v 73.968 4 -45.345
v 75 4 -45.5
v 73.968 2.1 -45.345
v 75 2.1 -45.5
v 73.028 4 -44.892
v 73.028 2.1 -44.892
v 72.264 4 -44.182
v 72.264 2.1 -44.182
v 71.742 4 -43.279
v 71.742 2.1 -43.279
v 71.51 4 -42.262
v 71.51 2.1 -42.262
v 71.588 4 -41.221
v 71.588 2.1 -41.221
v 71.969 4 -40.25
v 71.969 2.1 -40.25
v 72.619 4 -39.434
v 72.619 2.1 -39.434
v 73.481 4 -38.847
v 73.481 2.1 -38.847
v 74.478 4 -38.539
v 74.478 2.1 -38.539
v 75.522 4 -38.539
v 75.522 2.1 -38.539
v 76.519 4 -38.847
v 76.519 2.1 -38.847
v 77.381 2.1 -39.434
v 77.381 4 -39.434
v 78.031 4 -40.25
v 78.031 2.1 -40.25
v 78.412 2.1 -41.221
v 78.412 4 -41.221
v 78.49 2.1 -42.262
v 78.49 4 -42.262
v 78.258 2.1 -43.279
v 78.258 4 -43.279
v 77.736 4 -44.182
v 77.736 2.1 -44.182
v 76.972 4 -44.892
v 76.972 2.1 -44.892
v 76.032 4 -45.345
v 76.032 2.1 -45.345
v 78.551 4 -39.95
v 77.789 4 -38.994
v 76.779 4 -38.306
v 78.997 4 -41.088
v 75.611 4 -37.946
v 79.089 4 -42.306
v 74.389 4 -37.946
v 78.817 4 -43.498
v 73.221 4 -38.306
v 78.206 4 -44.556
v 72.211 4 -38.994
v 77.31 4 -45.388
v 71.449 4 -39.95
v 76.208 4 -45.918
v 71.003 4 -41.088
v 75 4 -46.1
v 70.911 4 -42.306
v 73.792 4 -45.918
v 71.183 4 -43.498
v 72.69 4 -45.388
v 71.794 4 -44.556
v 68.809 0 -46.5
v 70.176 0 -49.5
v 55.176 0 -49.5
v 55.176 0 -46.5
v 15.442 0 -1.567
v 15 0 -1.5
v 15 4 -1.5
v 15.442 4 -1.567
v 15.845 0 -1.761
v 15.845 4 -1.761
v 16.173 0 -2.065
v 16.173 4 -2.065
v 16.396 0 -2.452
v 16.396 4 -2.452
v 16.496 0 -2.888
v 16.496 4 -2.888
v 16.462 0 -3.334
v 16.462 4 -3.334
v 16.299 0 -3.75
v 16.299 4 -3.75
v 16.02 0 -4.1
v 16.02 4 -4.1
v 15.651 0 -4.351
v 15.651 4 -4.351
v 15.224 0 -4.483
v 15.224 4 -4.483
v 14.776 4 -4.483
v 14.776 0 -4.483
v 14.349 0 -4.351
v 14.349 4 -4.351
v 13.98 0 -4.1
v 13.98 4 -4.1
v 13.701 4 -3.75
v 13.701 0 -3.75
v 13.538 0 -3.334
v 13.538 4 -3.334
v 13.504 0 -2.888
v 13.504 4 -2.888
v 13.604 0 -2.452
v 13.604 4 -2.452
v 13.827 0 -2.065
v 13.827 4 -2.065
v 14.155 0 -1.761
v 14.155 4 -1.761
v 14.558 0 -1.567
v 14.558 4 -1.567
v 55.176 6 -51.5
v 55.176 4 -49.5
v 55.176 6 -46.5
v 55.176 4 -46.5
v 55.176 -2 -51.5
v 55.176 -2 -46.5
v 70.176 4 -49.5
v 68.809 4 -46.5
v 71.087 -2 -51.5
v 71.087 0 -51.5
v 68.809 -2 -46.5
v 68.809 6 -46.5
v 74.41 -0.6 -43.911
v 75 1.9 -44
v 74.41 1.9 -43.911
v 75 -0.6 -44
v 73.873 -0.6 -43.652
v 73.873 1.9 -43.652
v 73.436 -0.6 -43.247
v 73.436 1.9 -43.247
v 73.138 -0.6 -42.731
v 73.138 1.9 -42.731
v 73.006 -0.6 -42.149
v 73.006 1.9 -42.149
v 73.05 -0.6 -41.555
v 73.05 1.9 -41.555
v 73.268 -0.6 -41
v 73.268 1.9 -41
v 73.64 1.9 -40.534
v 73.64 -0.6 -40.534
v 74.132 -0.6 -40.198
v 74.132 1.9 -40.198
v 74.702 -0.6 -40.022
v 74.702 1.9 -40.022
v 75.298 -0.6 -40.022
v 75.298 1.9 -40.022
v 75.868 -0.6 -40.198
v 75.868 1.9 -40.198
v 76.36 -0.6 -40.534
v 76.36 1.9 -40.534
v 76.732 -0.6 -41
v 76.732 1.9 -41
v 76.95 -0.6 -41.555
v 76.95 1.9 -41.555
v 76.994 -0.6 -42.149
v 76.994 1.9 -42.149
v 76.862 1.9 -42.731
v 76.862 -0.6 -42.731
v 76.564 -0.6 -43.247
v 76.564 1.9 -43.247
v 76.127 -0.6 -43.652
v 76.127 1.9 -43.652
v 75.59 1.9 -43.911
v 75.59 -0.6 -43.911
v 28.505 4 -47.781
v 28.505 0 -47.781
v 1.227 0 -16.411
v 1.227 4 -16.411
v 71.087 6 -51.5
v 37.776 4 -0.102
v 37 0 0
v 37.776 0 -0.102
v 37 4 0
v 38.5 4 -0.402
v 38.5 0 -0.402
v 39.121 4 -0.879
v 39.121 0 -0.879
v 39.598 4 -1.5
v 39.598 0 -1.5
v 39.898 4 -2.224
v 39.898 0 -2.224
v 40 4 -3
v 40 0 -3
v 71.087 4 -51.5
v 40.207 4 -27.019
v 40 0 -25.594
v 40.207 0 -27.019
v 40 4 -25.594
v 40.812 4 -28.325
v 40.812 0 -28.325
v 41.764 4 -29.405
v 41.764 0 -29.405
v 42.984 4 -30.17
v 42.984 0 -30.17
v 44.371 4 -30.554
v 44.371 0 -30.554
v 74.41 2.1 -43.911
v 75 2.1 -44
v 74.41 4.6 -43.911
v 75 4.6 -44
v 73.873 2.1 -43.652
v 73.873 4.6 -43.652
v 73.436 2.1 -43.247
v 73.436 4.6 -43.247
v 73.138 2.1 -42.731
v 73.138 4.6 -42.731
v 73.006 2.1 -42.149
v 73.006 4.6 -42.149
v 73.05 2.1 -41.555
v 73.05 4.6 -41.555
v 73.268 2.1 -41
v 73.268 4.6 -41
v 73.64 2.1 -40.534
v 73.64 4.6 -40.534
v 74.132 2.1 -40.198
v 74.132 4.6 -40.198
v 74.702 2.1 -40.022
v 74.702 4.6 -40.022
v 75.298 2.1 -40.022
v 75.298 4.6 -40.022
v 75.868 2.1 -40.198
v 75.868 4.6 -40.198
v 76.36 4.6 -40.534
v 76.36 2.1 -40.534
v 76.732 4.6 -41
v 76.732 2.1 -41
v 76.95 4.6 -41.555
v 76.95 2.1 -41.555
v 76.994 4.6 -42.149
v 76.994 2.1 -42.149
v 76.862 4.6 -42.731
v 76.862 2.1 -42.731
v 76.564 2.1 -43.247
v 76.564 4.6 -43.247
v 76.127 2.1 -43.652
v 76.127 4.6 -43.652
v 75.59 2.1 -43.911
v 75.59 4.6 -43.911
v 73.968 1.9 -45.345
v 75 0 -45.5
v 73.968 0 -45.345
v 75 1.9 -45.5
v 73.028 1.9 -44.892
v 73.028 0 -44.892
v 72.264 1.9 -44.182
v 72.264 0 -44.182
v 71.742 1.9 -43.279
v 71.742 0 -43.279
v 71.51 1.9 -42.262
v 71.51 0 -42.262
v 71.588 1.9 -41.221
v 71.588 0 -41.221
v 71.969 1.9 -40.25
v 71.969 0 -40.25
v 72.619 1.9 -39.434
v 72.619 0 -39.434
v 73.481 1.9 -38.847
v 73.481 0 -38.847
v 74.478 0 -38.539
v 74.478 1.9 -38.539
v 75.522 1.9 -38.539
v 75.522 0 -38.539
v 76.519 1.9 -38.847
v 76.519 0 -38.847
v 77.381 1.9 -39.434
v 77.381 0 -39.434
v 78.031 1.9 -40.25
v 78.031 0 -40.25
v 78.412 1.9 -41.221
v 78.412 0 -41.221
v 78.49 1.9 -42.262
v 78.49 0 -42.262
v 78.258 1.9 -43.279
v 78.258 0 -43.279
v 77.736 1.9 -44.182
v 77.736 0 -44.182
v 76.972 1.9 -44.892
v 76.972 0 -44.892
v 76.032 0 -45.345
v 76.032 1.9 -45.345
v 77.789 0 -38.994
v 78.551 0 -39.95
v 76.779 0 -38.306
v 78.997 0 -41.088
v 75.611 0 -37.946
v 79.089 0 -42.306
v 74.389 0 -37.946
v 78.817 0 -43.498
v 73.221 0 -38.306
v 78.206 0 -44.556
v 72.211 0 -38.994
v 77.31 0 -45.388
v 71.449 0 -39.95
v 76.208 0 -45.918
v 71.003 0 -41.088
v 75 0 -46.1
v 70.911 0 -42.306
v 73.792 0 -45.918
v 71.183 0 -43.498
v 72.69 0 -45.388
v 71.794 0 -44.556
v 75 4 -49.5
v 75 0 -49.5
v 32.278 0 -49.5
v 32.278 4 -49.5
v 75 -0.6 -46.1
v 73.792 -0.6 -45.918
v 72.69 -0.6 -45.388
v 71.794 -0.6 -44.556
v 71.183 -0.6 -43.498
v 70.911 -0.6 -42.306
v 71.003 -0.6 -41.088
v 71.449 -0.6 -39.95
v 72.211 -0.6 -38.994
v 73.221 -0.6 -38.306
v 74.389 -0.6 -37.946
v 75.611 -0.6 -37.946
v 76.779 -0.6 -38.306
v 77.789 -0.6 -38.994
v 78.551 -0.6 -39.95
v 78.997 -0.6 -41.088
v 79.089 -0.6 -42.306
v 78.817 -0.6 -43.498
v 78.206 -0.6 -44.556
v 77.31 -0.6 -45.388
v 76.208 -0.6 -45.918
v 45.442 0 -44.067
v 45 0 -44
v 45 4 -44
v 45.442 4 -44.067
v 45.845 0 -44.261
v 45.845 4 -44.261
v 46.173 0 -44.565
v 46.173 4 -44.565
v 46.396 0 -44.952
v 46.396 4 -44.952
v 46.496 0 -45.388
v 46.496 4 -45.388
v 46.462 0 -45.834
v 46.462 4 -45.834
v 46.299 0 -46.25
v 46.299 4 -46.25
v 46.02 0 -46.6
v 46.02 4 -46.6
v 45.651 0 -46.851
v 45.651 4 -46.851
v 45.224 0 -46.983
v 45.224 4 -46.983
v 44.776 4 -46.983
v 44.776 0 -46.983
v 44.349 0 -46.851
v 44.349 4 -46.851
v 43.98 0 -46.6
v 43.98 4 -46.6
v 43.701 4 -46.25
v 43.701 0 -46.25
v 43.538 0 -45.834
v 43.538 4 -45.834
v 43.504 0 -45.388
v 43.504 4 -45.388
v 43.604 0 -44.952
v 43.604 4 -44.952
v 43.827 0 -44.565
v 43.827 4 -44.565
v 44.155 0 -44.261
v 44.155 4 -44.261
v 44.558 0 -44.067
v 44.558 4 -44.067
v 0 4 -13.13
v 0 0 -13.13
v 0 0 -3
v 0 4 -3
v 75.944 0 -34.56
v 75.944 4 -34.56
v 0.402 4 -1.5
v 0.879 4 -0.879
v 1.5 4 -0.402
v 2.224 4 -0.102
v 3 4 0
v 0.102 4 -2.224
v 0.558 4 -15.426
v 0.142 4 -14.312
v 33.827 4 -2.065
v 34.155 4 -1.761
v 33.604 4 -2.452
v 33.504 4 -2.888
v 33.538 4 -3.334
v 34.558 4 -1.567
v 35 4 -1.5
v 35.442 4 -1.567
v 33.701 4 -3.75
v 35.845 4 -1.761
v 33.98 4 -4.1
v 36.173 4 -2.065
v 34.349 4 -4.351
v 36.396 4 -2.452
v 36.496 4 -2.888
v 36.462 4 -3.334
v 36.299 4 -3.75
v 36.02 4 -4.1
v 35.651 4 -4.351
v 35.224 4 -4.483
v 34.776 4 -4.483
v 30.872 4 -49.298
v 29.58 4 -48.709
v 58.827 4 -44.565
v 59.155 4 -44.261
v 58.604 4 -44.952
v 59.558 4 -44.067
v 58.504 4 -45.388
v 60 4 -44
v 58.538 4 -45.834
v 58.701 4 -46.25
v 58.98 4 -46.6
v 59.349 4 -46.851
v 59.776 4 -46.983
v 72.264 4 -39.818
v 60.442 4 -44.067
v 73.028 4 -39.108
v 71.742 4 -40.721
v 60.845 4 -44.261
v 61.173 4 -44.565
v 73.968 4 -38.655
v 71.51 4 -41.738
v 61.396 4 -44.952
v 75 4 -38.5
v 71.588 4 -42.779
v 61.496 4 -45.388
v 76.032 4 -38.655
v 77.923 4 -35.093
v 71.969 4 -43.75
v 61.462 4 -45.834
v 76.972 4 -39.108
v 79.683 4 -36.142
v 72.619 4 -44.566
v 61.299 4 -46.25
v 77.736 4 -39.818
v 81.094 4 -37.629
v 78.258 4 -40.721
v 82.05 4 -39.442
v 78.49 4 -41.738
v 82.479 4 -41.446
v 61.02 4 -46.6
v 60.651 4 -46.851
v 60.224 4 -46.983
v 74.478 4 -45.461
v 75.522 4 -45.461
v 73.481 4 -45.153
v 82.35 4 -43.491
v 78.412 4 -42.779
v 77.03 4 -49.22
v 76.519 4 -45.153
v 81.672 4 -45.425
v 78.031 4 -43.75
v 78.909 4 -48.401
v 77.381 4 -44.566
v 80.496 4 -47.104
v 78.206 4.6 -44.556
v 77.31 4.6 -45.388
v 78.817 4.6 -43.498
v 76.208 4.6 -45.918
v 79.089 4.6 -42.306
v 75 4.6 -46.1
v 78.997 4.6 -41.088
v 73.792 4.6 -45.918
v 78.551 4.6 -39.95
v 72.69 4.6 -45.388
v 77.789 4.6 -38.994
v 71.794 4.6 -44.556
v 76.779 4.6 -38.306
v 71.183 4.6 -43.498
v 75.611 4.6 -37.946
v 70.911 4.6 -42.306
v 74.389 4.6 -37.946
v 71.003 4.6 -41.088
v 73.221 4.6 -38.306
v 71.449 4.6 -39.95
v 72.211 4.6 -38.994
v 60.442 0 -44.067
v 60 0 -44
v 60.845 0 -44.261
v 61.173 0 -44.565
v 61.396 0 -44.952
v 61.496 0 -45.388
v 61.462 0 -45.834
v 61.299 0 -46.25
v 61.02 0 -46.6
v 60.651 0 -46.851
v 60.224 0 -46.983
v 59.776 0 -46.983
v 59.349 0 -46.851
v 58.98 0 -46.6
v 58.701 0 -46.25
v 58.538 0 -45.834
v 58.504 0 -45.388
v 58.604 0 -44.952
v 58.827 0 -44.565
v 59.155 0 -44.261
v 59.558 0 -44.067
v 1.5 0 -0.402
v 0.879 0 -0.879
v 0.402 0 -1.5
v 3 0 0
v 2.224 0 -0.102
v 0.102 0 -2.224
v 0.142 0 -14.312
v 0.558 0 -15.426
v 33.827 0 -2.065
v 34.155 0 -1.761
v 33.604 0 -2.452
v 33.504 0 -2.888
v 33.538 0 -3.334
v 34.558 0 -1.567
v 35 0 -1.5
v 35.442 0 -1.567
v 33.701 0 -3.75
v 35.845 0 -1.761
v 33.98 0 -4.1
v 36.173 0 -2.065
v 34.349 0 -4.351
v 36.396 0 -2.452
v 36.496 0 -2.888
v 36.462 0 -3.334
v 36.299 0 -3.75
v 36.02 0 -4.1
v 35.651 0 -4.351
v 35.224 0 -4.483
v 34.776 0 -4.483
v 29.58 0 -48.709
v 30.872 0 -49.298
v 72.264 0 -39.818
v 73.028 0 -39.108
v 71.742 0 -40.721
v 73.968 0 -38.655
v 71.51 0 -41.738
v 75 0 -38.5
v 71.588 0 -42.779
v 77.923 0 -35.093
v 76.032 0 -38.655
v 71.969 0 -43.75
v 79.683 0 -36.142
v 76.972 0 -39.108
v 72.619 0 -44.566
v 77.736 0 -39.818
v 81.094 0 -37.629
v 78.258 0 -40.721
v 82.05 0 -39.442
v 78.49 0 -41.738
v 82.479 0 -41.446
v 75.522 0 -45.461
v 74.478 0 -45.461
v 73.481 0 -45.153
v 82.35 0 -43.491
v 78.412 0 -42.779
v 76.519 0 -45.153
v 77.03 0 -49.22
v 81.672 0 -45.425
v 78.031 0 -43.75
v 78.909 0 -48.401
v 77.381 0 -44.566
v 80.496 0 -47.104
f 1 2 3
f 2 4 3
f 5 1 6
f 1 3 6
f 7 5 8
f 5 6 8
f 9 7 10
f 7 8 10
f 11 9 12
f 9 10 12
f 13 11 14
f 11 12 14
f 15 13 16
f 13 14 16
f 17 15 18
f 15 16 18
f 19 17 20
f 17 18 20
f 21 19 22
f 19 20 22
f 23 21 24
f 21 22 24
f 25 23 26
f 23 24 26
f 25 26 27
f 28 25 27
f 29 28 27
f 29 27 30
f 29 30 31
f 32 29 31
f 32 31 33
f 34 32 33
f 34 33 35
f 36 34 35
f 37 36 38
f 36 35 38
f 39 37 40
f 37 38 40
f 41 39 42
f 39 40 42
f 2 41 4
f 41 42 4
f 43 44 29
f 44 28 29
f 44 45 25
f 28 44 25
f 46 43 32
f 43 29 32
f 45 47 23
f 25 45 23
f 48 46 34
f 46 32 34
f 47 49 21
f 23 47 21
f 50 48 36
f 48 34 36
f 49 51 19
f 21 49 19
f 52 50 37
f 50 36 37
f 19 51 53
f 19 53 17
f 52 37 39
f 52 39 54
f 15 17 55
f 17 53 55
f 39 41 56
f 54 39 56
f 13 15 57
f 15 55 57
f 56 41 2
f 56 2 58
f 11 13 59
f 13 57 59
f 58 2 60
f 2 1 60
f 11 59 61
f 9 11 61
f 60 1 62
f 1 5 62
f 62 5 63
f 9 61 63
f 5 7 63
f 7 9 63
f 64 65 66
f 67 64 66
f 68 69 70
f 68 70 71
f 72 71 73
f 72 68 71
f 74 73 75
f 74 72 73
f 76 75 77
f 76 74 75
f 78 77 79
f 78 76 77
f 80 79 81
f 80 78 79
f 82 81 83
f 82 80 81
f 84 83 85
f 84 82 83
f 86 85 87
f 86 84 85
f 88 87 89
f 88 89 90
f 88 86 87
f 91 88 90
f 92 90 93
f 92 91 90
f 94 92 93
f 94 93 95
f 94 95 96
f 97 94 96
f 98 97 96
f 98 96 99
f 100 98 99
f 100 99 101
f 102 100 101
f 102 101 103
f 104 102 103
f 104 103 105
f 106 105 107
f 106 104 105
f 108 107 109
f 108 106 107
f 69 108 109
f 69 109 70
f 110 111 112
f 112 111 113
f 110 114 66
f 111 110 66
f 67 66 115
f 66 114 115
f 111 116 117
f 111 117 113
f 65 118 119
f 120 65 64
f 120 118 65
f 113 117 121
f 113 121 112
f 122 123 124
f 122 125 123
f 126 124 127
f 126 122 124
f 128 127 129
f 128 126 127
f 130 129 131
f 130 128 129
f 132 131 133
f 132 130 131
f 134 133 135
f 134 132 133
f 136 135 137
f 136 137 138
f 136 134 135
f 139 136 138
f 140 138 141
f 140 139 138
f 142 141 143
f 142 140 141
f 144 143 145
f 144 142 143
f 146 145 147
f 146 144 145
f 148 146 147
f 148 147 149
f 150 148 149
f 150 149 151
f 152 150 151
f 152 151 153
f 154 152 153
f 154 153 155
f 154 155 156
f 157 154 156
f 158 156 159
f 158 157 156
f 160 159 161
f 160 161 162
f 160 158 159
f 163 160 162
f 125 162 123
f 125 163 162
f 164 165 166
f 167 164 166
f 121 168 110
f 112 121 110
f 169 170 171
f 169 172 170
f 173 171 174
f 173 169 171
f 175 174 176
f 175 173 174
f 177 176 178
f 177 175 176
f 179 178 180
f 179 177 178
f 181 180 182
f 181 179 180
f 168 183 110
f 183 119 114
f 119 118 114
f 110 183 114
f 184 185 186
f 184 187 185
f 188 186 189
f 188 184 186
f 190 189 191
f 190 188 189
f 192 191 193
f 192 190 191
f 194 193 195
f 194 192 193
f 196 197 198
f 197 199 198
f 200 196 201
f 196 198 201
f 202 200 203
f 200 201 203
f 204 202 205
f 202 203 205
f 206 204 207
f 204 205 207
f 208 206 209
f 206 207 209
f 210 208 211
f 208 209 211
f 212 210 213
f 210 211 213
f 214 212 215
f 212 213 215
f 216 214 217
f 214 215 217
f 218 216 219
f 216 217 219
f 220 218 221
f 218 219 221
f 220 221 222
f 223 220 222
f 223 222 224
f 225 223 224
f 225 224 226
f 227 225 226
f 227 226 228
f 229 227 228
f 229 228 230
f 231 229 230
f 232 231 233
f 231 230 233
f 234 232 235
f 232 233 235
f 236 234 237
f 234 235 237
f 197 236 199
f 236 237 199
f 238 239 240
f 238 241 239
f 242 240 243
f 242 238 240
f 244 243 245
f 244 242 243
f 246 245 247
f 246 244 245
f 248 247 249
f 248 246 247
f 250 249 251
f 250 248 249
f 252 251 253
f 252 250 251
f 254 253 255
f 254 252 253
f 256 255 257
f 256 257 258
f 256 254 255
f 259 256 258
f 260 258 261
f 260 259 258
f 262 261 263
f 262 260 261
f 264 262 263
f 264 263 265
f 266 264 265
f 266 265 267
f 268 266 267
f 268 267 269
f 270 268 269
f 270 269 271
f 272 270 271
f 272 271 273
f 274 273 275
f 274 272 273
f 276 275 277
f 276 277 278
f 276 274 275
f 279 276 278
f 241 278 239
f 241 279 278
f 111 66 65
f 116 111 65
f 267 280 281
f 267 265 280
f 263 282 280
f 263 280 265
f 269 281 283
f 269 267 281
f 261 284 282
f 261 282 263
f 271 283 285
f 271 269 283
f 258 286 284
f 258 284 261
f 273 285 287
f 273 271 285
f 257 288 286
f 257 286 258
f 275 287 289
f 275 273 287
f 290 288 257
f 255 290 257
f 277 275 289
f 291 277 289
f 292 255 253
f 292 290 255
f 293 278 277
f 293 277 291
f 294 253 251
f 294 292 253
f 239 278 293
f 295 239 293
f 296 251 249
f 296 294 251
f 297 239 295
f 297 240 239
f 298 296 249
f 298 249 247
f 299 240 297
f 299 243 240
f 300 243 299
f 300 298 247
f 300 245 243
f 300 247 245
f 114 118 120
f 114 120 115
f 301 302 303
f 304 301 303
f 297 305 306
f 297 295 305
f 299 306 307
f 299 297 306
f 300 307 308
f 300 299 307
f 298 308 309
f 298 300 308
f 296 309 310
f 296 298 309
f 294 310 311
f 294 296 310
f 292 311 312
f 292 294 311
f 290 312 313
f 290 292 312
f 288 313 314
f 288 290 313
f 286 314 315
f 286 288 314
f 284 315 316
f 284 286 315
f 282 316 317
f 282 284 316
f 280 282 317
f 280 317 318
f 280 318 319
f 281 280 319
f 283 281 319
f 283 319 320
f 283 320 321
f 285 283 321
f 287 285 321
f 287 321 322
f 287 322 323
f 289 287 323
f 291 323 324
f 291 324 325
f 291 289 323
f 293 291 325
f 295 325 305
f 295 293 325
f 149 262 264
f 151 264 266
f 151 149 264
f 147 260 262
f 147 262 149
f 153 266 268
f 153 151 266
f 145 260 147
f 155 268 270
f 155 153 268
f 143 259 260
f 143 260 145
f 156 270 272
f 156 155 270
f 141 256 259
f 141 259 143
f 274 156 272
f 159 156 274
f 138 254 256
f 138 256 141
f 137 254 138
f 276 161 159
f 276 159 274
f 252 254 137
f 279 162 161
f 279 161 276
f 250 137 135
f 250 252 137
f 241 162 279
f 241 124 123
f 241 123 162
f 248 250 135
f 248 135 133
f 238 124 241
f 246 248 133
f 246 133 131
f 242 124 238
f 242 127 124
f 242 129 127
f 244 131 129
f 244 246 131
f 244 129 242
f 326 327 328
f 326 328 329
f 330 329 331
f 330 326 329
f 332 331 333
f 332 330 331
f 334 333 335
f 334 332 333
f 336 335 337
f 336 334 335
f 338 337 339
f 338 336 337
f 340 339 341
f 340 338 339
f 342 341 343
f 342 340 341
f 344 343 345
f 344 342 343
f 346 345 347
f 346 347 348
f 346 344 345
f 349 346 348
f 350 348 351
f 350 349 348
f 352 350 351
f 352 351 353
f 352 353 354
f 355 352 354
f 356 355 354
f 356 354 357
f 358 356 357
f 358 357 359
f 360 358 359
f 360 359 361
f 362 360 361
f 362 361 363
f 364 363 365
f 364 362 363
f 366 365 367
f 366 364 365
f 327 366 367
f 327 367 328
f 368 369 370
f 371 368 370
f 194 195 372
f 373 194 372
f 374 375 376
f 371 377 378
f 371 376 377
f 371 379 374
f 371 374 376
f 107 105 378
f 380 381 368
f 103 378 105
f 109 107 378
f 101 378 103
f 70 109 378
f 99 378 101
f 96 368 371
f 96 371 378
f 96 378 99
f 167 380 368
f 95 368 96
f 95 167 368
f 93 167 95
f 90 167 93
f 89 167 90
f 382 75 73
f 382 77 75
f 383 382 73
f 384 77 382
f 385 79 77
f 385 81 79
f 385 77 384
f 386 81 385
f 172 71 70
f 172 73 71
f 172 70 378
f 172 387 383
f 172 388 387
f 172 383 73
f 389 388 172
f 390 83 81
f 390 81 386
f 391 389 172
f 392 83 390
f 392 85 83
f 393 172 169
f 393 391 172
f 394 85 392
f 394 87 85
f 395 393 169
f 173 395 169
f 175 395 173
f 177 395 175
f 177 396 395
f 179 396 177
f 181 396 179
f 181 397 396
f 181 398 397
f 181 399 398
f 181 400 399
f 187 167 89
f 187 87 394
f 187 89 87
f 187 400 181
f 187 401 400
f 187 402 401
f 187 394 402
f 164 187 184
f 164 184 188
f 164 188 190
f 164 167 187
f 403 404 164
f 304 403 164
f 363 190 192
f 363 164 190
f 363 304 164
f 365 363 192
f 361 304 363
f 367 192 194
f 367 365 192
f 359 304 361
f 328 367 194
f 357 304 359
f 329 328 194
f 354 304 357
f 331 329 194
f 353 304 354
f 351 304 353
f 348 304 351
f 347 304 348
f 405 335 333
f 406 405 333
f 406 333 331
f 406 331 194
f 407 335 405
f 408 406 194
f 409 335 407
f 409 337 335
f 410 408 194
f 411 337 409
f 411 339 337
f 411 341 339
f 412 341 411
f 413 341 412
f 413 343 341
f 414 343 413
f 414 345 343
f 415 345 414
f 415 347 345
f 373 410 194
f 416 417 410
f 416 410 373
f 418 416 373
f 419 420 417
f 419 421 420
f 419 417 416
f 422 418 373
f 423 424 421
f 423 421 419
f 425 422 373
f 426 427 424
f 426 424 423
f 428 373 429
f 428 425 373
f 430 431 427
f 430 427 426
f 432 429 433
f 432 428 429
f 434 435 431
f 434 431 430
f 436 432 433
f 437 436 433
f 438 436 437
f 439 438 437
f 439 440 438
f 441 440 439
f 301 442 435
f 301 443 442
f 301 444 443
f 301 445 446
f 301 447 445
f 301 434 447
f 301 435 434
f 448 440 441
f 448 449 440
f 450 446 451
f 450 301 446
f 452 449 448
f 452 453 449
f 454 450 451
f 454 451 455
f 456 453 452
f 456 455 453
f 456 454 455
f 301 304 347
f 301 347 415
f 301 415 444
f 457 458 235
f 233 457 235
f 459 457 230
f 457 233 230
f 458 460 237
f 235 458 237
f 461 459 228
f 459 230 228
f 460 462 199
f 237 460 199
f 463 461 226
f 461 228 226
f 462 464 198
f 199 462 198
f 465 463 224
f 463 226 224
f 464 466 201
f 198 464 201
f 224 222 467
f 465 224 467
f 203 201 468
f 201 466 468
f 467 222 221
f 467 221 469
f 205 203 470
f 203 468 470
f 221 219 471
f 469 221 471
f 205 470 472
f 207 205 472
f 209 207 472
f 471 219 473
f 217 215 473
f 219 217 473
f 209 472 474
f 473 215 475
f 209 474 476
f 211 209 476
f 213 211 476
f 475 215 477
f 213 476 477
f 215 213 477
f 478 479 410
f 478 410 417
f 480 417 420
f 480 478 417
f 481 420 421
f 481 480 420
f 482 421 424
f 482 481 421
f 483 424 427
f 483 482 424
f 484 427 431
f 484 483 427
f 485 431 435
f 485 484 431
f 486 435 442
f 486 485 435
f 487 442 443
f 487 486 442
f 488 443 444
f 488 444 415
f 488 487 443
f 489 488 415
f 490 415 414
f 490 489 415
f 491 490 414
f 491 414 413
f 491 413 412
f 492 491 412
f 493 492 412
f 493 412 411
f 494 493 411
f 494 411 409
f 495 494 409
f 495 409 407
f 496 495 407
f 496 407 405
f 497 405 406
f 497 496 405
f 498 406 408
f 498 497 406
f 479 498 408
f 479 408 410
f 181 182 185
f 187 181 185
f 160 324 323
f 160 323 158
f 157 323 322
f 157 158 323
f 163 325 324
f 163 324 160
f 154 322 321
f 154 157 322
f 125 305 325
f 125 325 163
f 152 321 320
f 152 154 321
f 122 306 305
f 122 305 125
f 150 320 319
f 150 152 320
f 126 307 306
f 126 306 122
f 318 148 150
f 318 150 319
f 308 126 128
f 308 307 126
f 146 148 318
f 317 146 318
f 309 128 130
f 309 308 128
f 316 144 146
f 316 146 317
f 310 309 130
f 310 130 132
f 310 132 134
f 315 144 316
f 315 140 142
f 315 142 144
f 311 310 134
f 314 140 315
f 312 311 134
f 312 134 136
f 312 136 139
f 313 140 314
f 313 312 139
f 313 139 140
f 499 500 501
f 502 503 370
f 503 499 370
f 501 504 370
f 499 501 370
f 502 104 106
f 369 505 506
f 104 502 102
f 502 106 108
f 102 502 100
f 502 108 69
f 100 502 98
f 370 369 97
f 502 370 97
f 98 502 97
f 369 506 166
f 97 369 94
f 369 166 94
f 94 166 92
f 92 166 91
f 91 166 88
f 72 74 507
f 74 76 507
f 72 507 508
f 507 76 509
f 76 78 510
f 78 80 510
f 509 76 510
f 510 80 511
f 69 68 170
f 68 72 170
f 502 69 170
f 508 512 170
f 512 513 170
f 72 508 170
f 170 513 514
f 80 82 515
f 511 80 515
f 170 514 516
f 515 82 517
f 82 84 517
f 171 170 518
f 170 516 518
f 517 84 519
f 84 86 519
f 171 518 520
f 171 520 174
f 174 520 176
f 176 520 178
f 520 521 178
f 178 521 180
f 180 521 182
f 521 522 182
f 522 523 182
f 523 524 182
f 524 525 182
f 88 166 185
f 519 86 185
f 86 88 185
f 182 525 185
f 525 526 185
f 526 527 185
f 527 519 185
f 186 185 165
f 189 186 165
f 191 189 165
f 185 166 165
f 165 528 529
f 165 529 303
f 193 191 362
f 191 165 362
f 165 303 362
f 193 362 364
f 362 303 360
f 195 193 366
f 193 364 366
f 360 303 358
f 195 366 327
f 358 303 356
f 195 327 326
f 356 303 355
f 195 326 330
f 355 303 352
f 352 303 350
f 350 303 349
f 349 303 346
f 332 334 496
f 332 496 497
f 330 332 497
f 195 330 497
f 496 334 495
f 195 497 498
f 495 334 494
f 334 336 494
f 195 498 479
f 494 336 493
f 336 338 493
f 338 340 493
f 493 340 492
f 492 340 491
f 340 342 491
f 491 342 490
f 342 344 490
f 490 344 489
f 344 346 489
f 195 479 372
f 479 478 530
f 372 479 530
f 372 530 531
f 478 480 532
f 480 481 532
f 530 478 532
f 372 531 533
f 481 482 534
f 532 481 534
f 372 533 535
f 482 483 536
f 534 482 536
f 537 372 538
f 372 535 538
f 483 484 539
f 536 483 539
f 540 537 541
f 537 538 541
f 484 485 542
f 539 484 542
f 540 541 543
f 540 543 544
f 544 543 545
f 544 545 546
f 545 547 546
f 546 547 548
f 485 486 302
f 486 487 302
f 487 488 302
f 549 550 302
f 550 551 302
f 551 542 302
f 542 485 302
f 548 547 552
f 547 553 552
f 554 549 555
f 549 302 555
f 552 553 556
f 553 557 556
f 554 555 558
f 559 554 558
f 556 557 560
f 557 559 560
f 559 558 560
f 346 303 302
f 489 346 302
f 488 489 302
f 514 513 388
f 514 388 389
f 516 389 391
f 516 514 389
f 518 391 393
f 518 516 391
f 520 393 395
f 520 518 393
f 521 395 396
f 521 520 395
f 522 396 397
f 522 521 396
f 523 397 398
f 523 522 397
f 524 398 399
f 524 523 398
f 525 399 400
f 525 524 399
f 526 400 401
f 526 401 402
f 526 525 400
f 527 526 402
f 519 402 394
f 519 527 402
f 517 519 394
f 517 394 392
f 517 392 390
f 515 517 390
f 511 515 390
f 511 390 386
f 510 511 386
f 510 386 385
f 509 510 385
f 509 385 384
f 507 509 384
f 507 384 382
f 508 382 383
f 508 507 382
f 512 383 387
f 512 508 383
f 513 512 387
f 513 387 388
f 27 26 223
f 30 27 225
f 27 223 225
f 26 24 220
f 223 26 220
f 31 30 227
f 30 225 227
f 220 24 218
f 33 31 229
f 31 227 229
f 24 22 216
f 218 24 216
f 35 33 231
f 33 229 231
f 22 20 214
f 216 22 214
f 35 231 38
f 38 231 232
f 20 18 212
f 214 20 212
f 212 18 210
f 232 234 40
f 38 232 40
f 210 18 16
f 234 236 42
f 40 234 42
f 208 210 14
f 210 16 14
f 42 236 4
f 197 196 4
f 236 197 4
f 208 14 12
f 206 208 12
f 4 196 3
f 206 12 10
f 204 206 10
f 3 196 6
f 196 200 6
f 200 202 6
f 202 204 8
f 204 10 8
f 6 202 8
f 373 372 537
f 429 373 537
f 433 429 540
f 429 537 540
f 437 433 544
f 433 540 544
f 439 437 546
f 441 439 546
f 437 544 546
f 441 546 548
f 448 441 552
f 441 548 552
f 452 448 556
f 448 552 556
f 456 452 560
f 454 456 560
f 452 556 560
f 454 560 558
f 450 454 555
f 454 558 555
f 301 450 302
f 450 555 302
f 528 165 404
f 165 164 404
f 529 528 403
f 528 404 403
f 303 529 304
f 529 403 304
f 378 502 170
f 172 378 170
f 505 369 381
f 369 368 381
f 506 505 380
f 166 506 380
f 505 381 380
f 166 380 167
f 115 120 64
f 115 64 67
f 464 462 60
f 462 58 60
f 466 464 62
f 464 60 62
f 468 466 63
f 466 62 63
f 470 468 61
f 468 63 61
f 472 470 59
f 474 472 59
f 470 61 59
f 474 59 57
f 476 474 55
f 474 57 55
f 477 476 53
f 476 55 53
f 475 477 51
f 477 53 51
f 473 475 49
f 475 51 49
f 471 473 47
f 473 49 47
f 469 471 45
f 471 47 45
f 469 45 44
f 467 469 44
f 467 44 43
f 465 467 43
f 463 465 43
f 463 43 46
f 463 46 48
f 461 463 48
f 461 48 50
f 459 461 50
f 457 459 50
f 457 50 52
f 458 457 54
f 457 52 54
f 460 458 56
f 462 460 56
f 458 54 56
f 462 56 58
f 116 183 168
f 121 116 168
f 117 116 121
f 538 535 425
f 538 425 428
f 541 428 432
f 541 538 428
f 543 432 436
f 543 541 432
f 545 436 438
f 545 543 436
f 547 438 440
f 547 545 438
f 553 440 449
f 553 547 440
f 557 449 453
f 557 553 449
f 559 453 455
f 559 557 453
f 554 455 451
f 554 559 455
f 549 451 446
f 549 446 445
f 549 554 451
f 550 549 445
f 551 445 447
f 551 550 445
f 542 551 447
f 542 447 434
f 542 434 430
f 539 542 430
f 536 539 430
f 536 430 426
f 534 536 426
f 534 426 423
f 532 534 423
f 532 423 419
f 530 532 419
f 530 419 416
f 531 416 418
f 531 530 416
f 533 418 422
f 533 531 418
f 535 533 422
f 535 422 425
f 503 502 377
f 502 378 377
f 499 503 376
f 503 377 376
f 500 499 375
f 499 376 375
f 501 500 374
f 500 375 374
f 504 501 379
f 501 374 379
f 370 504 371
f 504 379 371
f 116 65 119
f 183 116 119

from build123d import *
from OCP.BRepFilletAPI import BRepFilletAPI_MakeFillet

# Parameters (mm, degrees)
SKETCH_1_R             = 3.5
SKETCH_1_R_2           = 1.5
EXTRUDE_1_DEPTH        = 4
FILLET_1_R1            = 5
FILLET_1_R2            = 3
EXTRUDE_2_DEPTH        = 2
PATTERN_LINEAR_1_COUNT = 2
PATTERN_LINEAR_1_PITCH = 6
EXTRUDE_4_DEPTH        = 4


with BuildPart() as part:
    # 草图1 → 凸台-拉伸1 (new body)
    with BuildSketch(Plane(origin=(0, 0, 0), x_dir=(1, 0, 0), z_dir=(0, 1, 0))):
        with BuildLine():
            Line((0, 0), (40, 0))
            Line((40, 0), (40, 30))
            Line((40, 30), (75.943842427, 34.559626254))
            ThreePointArc((75.943842427, 34.559626254), (82.485078593, 42.472861982), (75, 49.5))
            Line((75, 49.5), (30, 49.5))
            Line((30, 49.5), (0, 15))
            Line((0, 15), (0, 0))
        make_face()
        with Locations(Location((75, 42, 0), (0, 0, 270))):
            Circle(SKETCH_1_R, mode=Mode.SUBTRACT)
        with Locations(Location((15, 3, 0), (0, 0, 270))):
            Circle(SKETCH_1_R_2, mode=Mode.SUBTRACT)
        with Locations(Location((35, 3, 0), (0, 0, 270))):
            Circle(SKETCH_1_R_2, mode=Mode.SUBTRACT)
        with Locations(Location((45, 45.5, 0), (0, 0, 270))):
            Circle(SKETCH_1_R_2, mode=Mode.SUBTRACT)
        with Locations(Location((60, 45.5, 0), (0, 0, 270))):
            Circle(SKETCH_1_R_2, mode=Mode.SUBTRACT)
    extrude(amount=EXTRUDE_1_DEPTH)

    # 圆角1: one fillet with a radius per group of edges: ONE call of the kernel's fillet builder (fillet() takes one radius for all edges)
    fillet_1_edges_1 = [part.edges().sort_by_distance(p)[0] for p in [
        (40, 2, -30),
        (30, 2, -49.5),
        (0, 2, -15),
    ]]
    fillet_1_edges_2 = [part.edges().sort_by_distance(p)[0] for p in [
        (40, 2, 0),
        (0, 2, 0),
    ]]
    fillet_1 = BRepFilletAPI_MakeFillet(part.part.solid().wrapped)
    for e in fillet_1_edges_1:
        fillet_1.Add(FILLET_1_R1, e.wrapped)
    for e in fillet_1_edges_2:
        fillet_1.Add(FILLET_1_R2, e.wrapped)
    add(Compound.cast(fillet_1.Shape()), mode=Mode.REPLACE)


with BuildPart() as body_2:
    # 草图2 → 旋转1 (revolve)
    with BuildSketch(Plane.ZY.offset(-75), mode=Mode.PRIVATE) as revolve_1_sk:
        Polygon((-38.5, 0), (-38.5, 1.9), (-40, 1.9), (-40, -0.6), (-37.9, -0.6), (-37.9, 0), align=None)
        Polygon((-38.5, 2.1), (-40, 2.1), (-40, 4.6), (-37.9, 4.6), (-37.9, 4), (-38.5, 4), align=None)
    revolve(revolve_1_sk.sketch.rotate(Axis((75, 0, -42), (0, 1, 0)), 180), axis=Axis((75, 0, -42), (0, 1, 0)))


with BuildPart() as body_3:
    # 草图3 → 凸台-拉伸2 (new body)
    with BuildSketch(Plane(origin=(0, 4, 0), x_dir=(1, 0, 0), z_dir=(0, 1, 0))):
        Polygon((71.087290406, 51.5), (68.808659128, 46.5), (55.175837895, 46.5), (55.175837895, 51.5), align=None)
    extrude_2 = extrude(amount=EXTRUDE_2_DEPTH)



with BuildPart() as pattern_linear_1_1:
    # 阵列(线性)1: 凸台-拉伸2 ×2
    with Locations(*[(0, -i * PATTERN_LINEAR_1_PITCH, 0) for i in range(1, PATTERN_LINEAR_1_COUNT)]):
        add(extrude_2)


with BuildPart() as body_3_1:
    add(body_3.part)

    add(pattern_linear_1_1.part)  # 凸台-拉伸4 merges 阵列(线性)1_1
    # 草图5 → 凸台-拉伸4 (add)
    with BuildSketch(Plane(origin=(0, 0, 0), x_dir=(1, 0, 0), z_dir=(0, 1, 0))):
        Polygon((55.175837895, 51.5), (55.175837895, 49.5), (70.175837895, 49.5), (71.087290406, 51.5), align=None)
    extrude(amount=EXTRUDE_4_DEPTH)


solid = Compound([part.part, body_2.part, body_3_1.part])
